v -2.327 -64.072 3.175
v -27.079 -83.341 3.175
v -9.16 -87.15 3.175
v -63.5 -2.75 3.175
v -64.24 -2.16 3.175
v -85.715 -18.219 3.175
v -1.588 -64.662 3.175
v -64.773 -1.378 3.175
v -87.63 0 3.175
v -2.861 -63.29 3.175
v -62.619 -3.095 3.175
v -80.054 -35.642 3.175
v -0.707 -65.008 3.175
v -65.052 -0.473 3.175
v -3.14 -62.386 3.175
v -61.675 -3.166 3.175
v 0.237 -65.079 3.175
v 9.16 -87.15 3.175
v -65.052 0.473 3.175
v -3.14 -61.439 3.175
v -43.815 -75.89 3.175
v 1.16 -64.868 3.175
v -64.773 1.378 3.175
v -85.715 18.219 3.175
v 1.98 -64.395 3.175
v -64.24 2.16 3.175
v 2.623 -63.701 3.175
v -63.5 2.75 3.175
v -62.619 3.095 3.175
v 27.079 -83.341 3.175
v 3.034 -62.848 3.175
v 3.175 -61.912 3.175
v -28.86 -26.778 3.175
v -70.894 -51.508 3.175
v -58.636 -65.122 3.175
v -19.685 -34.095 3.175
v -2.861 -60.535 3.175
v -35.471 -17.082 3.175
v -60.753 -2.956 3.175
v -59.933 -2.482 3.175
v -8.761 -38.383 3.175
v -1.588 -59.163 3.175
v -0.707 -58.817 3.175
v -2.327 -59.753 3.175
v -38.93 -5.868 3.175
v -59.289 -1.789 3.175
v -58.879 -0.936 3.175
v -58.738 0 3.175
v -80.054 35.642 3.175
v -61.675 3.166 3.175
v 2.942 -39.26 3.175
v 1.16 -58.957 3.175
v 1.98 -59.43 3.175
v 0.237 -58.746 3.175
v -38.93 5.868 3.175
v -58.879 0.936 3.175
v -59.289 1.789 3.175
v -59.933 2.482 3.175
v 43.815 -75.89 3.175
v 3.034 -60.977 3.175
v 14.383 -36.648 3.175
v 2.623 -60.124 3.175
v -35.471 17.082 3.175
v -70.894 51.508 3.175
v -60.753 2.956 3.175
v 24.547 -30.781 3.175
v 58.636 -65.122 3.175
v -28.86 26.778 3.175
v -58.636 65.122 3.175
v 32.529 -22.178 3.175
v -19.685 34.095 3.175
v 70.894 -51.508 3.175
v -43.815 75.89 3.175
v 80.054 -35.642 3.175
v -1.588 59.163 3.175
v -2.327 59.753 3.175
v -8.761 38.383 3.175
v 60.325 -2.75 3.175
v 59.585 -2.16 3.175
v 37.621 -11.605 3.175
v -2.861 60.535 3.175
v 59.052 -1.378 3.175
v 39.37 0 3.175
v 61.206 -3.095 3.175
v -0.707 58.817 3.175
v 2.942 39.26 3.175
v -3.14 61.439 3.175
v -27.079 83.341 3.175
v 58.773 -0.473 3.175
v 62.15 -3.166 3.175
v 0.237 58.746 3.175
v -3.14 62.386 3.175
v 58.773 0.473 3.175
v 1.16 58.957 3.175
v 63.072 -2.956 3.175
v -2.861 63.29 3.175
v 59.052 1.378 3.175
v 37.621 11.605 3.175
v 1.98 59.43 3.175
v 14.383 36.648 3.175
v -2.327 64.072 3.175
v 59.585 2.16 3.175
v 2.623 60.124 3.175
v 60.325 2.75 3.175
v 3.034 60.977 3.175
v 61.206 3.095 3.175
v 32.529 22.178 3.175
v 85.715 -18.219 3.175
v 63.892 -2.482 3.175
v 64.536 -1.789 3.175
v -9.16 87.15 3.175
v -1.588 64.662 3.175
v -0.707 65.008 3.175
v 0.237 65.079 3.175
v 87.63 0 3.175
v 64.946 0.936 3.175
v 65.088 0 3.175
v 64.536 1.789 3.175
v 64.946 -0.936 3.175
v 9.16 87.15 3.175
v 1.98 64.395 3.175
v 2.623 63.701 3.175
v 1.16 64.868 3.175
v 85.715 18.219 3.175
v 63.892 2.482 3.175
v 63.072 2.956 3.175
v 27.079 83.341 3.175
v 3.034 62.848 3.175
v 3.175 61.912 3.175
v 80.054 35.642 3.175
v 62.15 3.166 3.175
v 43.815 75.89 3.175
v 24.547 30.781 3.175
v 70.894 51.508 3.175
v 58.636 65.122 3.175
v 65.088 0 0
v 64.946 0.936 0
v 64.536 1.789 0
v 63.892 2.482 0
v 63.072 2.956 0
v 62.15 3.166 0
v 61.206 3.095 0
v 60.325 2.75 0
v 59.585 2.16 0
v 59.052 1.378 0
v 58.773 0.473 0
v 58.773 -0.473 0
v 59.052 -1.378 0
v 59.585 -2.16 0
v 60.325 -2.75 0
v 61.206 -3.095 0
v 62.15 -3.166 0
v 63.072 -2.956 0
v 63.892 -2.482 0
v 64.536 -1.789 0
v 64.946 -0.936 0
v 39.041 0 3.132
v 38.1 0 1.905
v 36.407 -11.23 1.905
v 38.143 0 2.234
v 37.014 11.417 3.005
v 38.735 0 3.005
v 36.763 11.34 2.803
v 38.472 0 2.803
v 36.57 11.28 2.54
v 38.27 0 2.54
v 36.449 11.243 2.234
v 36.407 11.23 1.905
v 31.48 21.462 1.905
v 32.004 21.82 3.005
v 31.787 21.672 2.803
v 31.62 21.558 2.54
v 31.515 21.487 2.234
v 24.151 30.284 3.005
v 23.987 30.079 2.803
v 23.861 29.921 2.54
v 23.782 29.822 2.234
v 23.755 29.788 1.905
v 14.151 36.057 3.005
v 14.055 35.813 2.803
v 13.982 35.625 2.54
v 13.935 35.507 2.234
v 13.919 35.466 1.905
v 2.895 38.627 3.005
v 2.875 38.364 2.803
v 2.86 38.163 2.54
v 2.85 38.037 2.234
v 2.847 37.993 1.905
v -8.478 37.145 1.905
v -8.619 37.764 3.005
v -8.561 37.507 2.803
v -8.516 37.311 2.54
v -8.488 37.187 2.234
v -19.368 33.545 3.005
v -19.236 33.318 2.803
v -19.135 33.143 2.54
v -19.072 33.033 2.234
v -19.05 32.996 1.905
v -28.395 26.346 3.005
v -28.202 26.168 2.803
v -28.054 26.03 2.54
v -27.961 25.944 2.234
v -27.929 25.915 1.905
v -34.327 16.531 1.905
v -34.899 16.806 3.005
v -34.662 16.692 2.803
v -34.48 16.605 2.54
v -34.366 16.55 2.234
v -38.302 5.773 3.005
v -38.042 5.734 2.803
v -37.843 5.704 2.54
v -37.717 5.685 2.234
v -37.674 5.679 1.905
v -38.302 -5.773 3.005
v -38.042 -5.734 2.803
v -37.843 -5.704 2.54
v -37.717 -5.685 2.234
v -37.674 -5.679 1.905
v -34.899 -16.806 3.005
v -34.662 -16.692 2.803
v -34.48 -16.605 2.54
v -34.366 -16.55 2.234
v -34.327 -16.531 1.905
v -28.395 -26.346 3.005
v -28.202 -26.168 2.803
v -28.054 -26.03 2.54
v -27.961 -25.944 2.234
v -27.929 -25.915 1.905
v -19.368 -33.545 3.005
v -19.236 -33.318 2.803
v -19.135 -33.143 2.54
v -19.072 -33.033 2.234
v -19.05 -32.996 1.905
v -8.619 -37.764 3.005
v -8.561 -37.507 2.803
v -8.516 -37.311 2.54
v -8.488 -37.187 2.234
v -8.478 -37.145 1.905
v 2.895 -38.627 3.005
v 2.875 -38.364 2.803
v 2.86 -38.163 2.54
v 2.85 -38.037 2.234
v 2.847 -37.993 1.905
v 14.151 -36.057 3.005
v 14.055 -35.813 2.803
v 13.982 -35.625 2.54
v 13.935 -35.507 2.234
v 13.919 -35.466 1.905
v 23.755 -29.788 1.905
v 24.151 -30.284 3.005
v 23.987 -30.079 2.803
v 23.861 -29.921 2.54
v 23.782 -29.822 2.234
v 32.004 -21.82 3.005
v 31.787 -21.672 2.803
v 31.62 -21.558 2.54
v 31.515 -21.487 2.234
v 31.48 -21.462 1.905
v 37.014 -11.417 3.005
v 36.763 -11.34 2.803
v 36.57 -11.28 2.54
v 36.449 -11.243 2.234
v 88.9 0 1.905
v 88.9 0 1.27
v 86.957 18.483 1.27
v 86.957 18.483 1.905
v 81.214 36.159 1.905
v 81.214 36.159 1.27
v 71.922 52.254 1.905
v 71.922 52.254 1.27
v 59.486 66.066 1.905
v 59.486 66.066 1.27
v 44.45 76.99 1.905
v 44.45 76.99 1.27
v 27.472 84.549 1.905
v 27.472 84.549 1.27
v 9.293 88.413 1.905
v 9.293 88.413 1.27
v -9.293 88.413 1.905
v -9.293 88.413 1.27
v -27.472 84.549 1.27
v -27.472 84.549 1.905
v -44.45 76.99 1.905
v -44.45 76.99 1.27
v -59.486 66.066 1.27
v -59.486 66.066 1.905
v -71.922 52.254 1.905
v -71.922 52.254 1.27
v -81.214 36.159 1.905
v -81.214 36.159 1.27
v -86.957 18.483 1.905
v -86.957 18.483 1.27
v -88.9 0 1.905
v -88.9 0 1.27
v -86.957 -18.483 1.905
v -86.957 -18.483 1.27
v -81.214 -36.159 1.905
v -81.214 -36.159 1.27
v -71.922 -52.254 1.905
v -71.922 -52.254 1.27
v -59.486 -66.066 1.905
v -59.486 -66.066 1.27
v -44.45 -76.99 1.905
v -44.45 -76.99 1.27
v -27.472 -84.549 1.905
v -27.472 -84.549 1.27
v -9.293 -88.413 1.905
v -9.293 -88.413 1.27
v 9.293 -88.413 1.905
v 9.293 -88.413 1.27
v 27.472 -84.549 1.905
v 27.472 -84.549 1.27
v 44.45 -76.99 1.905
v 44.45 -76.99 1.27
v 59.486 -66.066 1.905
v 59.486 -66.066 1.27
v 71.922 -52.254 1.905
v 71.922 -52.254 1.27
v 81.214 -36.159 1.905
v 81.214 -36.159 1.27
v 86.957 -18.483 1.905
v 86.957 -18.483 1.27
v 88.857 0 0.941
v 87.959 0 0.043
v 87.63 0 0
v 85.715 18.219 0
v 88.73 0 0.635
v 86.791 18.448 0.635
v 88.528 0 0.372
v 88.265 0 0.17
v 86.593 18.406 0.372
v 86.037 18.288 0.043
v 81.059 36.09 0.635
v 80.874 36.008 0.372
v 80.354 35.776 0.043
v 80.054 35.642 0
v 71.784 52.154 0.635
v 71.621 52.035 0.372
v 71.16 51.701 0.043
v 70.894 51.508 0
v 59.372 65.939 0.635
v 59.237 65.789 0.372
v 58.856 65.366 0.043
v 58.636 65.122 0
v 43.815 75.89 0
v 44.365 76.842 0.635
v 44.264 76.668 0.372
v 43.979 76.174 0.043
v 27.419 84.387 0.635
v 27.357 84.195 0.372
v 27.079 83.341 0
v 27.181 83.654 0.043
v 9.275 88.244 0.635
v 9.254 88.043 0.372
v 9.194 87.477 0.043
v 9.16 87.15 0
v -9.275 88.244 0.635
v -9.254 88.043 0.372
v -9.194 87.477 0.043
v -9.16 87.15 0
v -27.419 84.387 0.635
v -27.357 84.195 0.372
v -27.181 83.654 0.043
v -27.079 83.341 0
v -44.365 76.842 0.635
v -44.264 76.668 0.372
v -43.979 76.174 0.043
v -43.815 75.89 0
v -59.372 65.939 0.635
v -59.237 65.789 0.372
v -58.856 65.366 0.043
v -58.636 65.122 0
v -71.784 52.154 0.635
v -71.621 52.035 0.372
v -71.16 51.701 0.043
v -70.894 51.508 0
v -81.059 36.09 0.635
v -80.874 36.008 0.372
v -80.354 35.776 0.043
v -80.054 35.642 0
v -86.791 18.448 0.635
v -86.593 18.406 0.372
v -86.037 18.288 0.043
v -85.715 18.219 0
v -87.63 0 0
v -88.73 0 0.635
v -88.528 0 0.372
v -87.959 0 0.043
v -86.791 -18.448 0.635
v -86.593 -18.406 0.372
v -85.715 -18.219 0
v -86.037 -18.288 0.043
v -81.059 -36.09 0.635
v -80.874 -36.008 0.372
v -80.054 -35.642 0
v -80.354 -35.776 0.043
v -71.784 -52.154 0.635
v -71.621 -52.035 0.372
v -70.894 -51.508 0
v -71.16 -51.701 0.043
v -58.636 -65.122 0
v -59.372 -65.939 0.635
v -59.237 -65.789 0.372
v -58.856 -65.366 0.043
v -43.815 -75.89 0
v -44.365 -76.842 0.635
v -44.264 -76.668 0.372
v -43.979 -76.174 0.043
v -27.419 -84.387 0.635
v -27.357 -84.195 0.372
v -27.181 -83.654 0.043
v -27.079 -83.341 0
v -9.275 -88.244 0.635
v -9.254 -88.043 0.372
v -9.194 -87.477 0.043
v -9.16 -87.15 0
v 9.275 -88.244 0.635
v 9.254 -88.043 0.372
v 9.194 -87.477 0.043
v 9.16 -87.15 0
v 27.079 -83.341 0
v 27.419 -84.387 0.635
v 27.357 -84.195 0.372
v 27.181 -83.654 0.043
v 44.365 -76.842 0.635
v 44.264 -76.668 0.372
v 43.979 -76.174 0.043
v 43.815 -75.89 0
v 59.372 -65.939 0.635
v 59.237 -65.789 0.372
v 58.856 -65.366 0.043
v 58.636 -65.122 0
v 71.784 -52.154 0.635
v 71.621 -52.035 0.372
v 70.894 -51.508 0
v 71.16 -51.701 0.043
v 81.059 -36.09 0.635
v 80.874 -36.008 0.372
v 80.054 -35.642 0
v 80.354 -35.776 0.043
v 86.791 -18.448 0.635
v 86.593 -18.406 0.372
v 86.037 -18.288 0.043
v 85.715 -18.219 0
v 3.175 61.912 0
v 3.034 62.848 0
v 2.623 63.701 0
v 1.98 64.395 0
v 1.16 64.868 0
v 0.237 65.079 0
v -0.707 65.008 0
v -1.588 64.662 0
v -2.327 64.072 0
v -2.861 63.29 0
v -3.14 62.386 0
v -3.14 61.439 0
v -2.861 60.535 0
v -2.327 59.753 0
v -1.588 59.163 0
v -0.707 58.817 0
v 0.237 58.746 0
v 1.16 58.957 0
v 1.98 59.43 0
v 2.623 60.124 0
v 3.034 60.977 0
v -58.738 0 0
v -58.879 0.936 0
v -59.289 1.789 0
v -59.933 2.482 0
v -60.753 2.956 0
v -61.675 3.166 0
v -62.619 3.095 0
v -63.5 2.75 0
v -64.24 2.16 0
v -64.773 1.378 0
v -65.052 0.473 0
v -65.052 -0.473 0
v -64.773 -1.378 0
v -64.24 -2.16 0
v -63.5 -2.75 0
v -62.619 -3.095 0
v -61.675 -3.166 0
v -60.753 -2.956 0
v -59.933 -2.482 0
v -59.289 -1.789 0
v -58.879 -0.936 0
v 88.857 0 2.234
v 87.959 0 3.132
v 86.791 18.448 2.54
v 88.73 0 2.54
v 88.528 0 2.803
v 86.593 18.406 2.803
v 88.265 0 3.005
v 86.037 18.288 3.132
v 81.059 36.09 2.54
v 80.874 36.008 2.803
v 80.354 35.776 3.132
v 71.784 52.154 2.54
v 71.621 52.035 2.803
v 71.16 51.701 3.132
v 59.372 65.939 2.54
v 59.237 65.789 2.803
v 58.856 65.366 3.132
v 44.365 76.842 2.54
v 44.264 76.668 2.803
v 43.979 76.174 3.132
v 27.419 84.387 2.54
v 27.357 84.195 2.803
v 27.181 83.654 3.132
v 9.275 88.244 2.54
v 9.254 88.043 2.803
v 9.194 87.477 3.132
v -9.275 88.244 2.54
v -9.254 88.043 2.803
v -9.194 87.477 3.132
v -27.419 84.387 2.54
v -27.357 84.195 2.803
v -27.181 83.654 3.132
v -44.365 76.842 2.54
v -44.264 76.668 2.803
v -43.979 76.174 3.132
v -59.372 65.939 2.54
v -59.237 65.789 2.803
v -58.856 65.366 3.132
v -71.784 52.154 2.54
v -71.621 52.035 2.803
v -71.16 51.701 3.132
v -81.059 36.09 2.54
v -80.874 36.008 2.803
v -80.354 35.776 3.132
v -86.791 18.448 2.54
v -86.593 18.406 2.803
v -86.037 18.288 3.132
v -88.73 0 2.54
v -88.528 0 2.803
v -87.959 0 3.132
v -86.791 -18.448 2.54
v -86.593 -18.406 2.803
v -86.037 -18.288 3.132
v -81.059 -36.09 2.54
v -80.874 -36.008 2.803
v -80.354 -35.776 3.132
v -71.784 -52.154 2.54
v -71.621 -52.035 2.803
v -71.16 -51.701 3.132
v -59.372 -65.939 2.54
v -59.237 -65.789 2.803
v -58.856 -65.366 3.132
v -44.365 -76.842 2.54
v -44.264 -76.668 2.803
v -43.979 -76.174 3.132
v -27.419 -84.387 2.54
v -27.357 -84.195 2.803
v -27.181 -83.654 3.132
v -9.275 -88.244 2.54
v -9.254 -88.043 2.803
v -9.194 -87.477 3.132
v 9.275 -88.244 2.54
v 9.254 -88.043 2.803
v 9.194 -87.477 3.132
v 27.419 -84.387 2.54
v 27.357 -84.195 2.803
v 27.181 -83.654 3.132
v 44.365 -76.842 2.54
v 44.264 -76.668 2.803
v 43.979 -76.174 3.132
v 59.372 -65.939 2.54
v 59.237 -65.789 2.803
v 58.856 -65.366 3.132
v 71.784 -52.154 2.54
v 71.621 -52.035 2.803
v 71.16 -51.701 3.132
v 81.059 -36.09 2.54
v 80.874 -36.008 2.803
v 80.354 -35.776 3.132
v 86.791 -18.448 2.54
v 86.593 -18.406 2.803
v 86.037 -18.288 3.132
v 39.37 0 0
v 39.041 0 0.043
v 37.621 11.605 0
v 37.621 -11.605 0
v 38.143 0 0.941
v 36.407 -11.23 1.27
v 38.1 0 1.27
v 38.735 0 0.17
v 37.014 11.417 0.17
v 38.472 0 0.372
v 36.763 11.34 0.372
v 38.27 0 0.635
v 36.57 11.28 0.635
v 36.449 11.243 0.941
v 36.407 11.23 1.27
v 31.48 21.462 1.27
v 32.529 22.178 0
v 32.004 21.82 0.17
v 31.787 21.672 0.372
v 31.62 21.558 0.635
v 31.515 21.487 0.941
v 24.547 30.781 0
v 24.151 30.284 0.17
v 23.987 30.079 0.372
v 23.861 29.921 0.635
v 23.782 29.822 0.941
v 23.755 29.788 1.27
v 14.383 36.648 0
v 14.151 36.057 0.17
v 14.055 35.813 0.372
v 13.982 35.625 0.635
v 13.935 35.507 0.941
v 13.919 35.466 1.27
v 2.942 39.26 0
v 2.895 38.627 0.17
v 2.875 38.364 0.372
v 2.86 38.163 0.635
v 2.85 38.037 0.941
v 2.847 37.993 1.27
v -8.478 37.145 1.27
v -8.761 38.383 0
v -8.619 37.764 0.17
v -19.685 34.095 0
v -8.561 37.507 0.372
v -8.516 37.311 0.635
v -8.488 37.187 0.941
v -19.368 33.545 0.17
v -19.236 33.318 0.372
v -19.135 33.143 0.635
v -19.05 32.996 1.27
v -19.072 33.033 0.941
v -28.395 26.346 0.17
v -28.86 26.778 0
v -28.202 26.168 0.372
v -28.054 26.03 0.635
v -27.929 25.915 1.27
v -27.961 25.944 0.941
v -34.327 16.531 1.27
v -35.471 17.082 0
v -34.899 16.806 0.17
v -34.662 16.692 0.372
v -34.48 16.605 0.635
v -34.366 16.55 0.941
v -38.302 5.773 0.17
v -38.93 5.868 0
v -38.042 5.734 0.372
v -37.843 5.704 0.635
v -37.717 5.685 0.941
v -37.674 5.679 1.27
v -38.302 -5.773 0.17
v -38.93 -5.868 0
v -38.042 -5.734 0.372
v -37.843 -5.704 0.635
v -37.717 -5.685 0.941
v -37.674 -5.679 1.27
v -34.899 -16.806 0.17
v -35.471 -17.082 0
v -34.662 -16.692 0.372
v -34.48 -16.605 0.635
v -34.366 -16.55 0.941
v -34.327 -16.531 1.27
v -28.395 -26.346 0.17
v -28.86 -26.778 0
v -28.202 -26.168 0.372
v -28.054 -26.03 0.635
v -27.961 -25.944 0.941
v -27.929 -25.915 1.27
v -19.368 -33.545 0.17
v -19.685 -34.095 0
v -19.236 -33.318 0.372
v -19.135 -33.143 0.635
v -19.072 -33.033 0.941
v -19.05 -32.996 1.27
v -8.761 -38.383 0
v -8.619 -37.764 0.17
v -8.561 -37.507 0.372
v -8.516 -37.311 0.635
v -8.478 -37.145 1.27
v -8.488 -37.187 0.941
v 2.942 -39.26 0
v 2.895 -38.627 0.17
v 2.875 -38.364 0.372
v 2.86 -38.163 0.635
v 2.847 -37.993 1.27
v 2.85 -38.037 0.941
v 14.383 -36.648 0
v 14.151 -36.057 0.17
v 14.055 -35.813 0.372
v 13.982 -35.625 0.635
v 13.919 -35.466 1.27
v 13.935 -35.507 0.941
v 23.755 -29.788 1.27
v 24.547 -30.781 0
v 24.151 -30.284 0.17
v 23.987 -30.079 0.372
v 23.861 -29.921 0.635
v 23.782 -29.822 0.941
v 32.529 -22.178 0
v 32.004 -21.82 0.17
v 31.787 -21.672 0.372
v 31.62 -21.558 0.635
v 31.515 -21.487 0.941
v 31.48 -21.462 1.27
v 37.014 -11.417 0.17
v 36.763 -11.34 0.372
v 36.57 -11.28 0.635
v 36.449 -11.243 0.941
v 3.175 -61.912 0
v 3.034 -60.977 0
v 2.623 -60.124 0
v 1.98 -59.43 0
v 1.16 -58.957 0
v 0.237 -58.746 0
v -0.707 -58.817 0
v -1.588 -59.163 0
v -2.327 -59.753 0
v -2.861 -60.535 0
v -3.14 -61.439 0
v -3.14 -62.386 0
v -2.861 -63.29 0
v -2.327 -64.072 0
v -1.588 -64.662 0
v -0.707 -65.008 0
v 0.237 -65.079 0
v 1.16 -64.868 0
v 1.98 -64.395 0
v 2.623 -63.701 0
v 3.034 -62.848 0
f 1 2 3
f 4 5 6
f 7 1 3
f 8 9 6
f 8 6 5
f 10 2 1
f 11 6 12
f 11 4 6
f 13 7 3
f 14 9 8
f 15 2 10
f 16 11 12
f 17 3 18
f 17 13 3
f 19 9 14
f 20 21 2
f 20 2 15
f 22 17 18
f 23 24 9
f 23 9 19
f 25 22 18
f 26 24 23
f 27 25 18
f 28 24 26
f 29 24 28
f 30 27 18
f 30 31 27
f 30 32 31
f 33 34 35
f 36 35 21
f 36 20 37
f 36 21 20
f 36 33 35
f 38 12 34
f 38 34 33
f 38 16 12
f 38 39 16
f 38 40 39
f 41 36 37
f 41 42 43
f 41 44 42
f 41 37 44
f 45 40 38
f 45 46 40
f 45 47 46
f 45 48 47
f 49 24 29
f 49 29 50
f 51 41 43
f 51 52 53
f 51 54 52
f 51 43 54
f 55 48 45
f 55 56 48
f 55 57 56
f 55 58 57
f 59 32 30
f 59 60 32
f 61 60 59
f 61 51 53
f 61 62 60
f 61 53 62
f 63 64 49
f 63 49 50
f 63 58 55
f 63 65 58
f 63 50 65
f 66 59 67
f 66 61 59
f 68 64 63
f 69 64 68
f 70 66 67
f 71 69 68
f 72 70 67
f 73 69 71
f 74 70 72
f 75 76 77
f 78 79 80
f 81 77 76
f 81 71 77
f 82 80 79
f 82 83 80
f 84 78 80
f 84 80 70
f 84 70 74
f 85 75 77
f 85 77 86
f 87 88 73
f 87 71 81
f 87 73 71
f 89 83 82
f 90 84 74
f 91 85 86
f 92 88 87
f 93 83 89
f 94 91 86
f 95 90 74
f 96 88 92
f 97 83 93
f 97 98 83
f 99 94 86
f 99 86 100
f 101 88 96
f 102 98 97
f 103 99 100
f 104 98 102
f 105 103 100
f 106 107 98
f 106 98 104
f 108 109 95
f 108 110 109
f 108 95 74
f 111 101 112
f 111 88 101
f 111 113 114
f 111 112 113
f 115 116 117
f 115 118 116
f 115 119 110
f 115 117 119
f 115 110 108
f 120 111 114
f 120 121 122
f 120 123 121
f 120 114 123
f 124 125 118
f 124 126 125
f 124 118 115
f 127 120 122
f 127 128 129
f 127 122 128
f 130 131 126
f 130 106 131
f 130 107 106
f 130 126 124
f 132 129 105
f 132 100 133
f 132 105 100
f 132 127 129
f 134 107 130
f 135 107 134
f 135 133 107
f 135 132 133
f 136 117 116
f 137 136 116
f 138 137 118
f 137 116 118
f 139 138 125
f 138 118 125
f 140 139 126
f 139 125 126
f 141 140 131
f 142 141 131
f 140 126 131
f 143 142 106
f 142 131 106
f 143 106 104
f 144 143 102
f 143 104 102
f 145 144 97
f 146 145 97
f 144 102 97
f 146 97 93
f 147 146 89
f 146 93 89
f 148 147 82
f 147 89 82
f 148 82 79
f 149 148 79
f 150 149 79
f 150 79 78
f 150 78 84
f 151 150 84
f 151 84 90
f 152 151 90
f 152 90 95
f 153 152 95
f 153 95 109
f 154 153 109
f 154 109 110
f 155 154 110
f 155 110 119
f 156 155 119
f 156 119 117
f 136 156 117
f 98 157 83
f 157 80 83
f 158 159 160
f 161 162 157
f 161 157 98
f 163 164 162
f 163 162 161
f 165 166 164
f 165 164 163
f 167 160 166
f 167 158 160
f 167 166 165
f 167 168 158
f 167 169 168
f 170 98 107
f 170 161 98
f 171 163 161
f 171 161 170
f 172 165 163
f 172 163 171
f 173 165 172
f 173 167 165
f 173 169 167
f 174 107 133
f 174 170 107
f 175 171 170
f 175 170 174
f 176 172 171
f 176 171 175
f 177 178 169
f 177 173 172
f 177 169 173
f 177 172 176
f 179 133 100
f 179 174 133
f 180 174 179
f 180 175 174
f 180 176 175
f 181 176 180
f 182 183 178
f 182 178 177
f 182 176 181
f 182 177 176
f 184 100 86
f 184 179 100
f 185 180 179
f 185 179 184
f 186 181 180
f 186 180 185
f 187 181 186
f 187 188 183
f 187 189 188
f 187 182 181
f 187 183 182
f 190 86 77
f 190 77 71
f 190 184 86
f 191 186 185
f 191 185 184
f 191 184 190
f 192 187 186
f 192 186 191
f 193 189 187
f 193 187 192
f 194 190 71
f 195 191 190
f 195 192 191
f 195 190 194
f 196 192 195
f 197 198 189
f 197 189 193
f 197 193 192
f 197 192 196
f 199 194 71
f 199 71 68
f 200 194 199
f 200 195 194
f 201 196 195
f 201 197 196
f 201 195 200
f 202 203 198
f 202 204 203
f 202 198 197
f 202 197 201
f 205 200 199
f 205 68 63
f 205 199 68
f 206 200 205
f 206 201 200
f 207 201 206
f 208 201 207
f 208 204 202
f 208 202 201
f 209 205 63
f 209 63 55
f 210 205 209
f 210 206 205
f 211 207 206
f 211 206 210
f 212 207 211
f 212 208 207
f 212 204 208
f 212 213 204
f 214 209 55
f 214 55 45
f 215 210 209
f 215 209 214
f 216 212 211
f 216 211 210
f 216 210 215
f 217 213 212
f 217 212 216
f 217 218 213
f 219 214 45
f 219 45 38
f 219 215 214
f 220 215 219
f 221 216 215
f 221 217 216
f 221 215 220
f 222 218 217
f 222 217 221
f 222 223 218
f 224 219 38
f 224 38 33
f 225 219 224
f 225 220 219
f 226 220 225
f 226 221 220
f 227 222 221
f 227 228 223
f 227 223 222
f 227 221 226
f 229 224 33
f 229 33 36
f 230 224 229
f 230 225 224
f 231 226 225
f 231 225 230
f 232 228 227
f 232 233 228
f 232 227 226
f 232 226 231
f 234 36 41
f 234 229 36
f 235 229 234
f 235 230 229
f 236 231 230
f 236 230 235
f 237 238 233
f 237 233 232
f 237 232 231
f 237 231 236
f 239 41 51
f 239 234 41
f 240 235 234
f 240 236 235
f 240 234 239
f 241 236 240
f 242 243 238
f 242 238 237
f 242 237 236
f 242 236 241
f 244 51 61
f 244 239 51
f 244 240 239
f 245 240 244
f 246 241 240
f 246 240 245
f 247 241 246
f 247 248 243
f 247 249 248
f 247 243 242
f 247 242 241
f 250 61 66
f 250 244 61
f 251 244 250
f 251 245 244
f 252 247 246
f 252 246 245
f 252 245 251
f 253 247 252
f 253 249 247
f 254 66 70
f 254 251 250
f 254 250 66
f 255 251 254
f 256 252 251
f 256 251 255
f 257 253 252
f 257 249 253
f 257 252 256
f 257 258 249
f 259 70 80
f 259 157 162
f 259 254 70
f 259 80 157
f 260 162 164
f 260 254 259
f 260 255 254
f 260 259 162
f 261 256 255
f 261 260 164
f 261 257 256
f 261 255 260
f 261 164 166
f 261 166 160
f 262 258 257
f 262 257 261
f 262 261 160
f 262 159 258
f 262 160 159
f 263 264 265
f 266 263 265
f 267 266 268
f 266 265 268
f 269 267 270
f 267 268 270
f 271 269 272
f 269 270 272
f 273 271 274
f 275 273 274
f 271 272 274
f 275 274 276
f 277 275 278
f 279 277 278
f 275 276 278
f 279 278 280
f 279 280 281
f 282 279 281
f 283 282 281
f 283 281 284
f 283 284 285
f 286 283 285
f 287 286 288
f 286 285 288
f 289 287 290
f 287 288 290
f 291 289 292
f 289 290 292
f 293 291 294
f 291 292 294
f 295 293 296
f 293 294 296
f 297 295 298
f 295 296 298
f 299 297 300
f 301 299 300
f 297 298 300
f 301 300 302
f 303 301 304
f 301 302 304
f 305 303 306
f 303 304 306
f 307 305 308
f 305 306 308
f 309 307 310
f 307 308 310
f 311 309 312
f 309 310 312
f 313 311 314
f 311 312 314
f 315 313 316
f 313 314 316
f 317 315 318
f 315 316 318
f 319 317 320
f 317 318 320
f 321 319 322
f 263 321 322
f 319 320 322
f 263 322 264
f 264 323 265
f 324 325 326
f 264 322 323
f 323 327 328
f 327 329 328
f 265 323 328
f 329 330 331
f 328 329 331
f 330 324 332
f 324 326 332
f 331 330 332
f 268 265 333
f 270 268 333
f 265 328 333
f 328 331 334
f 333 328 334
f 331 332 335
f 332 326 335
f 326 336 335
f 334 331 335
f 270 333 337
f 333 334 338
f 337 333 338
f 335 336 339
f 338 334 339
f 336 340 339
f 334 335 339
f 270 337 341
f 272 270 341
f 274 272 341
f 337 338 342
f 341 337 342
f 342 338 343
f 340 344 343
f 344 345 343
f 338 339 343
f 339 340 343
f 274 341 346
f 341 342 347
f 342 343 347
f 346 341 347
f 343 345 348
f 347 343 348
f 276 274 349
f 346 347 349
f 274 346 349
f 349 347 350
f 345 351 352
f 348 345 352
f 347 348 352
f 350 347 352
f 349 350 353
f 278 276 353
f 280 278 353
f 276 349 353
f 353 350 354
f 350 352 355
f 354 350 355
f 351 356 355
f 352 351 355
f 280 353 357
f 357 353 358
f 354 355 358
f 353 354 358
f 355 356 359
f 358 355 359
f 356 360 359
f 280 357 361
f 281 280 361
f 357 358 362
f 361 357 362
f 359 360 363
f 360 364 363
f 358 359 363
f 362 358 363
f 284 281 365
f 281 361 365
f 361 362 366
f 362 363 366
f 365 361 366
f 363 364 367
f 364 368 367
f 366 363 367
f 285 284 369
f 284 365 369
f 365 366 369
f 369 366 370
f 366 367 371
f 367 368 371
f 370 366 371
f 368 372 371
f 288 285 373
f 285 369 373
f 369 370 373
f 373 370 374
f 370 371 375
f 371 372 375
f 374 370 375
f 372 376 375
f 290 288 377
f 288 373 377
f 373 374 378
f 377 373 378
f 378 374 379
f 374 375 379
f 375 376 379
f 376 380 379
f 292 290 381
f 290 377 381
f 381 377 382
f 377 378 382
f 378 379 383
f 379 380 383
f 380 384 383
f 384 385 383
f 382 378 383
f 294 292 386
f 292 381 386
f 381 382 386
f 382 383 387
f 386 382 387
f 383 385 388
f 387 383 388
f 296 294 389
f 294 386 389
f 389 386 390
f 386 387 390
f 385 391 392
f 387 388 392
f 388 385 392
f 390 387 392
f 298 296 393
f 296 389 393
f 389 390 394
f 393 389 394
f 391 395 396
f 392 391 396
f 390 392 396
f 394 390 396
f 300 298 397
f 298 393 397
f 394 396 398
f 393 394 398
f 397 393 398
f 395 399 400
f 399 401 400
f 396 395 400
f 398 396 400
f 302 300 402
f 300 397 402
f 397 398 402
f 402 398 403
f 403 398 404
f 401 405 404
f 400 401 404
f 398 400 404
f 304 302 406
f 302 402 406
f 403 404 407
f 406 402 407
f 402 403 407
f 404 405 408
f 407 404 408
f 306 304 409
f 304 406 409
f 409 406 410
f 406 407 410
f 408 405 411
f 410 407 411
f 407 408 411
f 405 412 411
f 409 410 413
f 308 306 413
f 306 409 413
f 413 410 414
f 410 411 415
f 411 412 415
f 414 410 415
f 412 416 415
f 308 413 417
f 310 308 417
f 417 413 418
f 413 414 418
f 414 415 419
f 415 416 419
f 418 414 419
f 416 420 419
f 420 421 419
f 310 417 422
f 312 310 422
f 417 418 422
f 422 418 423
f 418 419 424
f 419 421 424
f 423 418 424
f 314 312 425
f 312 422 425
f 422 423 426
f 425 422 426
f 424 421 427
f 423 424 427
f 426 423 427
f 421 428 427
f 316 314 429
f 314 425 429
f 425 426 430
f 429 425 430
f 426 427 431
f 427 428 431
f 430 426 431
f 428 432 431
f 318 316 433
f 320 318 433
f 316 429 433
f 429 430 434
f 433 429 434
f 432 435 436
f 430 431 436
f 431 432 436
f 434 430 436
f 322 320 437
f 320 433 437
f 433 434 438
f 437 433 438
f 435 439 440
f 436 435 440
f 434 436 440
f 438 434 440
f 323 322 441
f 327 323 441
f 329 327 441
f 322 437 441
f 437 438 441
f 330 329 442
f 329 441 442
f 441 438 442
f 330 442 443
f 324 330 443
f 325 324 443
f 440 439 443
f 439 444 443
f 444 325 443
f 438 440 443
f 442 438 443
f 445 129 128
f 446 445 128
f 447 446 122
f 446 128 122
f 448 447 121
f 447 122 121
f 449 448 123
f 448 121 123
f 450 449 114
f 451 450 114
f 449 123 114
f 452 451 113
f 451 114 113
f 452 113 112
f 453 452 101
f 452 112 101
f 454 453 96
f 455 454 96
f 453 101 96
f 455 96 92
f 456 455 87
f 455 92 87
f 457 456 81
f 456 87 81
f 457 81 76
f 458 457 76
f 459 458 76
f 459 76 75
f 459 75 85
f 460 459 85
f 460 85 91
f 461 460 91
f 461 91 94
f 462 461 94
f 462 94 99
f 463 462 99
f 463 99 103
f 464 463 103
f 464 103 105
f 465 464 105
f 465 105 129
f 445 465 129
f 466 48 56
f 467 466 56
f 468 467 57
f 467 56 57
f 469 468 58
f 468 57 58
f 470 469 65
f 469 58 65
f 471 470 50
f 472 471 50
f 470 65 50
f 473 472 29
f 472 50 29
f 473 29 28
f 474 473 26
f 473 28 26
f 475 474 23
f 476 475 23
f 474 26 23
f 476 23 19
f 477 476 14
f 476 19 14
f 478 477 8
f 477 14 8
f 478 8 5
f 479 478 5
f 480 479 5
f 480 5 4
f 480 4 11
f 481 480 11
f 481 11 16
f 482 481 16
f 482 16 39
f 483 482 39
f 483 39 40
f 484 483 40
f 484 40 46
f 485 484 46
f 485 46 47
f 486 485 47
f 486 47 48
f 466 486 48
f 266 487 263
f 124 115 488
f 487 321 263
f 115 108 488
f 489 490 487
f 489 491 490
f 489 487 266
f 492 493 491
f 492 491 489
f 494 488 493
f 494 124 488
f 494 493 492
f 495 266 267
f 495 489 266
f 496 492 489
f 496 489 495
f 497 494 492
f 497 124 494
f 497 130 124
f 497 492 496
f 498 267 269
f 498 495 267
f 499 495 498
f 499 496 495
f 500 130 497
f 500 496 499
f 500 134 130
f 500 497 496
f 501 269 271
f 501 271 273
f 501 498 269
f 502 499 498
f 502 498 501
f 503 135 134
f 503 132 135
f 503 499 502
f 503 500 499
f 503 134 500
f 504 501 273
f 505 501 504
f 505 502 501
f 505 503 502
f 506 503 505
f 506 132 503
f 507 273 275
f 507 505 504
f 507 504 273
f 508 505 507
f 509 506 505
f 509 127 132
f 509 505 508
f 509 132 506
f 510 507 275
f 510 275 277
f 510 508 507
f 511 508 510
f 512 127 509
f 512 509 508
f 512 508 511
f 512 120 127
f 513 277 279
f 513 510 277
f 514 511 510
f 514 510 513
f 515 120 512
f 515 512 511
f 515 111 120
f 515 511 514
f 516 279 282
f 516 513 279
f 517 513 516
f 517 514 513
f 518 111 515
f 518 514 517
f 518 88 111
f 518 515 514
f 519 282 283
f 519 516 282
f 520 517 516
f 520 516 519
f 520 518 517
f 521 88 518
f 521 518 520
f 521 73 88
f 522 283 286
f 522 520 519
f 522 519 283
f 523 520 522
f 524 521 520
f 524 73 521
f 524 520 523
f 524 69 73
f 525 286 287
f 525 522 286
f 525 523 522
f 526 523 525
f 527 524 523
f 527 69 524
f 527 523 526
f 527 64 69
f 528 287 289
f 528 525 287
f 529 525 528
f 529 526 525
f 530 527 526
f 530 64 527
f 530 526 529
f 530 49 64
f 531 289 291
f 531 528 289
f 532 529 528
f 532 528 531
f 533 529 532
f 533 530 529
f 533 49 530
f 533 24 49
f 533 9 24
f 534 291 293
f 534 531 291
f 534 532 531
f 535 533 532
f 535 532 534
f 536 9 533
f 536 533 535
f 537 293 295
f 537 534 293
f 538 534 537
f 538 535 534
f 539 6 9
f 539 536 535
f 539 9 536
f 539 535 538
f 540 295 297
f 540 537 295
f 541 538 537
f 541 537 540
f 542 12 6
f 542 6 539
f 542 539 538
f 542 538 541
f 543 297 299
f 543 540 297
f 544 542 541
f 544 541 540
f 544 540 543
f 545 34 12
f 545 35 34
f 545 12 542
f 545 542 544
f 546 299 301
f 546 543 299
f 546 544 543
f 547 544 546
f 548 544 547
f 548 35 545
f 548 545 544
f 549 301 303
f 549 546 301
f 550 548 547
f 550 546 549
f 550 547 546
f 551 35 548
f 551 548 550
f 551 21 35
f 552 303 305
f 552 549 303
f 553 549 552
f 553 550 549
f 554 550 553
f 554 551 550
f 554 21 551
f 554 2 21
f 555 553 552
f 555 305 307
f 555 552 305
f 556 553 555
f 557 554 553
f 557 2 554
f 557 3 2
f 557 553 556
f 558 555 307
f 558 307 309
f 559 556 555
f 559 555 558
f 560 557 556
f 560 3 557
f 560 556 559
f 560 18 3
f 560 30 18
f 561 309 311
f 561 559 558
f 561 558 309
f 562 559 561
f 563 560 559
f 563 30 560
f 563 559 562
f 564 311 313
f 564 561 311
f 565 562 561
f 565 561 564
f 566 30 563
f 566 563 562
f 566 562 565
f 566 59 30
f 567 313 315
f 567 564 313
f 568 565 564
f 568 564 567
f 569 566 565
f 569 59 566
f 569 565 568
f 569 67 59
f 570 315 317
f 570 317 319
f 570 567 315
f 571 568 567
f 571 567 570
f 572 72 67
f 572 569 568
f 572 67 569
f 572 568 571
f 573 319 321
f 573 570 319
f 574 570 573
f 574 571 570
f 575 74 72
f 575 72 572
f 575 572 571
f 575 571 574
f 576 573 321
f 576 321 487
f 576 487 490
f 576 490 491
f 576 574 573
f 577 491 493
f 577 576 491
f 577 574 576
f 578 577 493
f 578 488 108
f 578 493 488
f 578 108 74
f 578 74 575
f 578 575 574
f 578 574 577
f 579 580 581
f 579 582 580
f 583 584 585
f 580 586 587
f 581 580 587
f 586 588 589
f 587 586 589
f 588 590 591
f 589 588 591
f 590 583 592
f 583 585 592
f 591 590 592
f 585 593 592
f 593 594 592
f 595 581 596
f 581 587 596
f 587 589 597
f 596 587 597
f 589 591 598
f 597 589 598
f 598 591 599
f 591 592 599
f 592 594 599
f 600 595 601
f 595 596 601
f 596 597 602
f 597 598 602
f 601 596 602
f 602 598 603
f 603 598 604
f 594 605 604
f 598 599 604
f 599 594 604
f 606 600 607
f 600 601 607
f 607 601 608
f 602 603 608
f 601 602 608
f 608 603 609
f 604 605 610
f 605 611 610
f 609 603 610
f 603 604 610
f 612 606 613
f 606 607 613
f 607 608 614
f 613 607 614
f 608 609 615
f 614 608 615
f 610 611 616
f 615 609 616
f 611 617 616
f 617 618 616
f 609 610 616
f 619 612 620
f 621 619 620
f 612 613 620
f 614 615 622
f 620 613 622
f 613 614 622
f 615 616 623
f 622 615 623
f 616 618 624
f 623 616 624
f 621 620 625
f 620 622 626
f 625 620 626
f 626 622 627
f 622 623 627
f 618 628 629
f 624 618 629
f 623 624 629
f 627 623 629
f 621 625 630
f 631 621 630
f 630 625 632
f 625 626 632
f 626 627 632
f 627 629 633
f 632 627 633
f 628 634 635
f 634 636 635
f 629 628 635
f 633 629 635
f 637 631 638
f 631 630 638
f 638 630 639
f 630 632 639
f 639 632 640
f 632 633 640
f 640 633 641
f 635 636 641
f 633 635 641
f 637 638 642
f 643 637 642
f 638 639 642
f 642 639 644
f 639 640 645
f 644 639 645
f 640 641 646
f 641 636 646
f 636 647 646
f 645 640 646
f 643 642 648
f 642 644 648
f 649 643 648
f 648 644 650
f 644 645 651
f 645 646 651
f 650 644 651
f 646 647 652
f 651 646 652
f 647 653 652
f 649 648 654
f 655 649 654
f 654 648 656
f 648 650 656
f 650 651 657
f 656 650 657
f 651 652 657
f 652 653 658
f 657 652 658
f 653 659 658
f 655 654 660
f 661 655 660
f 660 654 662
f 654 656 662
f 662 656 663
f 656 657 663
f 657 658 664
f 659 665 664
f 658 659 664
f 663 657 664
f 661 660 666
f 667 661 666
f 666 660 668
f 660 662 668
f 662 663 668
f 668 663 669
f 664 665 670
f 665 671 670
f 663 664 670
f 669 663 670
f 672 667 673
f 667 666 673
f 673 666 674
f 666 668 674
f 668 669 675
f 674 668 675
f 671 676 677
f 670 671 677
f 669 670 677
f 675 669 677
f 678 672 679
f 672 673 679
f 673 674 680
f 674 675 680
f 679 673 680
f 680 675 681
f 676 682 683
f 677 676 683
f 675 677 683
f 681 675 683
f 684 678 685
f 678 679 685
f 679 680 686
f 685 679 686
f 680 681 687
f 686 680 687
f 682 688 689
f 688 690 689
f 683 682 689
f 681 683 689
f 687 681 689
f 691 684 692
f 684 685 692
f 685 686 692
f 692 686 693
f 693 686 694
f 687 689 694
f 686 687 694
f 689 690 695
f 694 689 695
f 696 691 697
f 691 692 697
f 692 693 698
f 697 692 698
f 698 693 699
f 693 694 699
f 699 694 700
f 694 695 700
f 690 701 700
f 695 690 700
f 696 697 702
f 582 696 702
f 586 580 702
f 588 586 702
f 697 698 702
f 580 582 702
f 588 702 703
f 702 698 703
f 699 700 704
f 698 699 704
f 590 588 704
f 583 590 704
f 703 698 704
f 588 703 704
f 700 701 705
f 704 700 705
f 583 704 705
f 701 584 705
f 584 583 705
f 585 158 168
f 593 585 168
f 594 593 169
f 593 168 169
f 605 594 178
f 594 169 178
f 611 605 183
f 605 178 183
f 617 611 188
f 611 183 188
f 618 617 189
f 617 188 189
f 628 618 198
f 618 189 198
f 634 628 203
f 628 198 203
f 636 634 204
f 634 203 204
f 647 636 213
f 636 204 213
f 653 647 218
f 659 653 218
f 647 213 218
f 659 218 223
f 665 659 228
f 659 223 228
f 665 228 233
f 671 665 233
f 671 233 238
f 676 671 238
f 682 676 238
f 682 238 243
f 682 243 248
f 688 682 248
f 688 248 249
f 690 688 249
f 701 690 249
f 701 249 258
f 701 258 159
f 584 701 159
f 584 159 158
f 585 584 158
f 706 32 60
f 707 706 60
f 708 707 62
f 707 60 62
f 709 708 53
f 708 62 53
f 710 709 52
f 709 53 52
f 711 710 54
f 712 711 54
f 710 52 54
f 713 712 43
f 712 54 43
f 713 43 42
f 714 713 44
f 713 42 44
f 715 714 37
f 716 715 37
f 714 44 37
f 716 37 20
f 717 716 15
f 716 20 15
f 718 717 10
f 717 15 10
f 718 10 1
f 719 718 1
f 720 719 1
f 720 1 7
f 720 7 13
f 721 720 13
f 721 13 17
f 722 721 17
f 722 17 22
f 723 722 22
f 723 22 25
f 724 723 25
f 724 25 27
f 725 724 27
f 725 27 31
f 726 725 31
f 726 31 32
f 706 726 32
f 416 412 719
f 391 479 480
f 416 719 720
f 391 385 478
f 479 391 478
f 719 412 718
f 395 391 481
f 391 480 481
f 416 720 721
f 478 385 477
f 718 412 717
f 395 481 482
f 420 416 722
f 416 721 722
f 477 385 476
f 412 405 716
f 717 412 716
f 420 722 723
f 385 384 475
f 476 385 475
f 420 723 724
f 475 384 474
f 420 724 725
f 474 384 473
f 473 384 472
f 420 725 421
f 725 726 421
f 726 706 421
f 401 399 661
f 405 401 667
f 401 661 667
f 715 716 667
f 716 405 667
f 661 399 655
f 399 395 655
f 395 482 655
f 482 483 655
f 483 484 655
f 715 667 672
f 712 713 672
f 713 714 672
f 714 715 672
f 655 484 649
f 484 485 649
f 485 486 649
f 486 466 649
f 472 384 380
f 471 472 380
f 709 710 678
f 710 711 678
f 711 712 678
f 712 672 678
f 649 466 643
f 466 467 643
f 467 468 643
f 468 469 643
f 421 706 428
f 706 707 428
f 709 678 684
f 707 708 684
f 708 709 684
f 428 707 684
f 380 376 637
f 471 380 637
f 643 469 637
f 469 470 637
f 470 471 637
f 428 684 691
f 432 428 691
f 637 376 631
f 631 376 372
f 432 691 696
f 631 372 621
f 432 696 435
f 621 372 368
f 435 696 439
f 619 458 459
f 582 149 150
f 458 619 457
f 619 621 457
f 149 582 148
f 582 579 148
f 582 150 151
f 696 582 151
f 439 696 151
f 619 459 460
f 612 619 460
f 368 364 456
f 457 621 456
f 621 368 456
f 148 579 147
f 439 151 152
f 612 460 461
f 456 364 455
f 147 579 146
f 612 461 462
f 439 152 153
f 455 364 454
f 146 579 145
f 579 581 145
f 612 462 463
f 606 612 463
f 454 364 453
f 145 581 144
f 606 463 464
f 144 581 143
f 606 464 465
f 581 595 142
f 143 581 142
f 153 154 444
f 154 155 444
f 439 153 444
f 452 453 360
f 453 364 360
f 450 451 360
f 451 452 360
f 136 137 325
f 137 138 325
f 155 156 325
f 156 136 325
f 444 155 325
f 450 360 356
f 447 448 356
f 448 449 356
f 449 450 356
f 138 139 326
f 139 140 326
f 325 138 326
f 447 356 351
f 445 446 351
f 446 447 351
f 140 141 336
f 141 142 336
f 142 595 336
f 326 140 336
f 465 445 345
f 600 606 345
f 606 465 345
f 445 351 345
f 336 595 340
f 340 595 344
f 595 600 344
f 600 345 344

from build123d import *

# Parameters (mm, degrees)
SKETCH1_R           = 88.9
BOSS_EXTRUDE1_DEPTH = 3.175
FILLET1_R           = 1.27
SKETCH2_R           = 38.1
SKETCH2_R_2         = 3.175
CUT_EXTRUDE1_DEPTH  = 12.7
FILLET2_R           = 1.27


with BuildPart() as part:
    # Sketch1 → Boss-Extrude1 (new body)
    with BuildSketch(Plane.XY):
        Circle(SKETCH1_R)
    extrude(amount=BOSS_EXTRUDE1_DEPTH)

    # Fillet1
    fillet1_edges = [part.edges().sort_by_distance(p)[0] for p in [
        (-88.9, 0, 0),
        (-88.9, 0, 3.175),
    ]]
    fillet(fillet1_edges, radius=FILLET1_R)

    # Sketch2 → Cut-Extrude1 (cut)
    with BuildSketch(Plane.XY.offset(3.175)):
        Circle(SKETCH2_R)
        with Locations((0, 61.9125)):
            Circle(SKETCH2_R_2)
        with Locations((61.9125, 0)):
            Circle(SKETCH2_R_2)
        with Locations((0, -61.9125)):
            Circle(SKETCH2_R_2)
        with Locations((-61.9125, 0)):
            Circle(SKETCH2_R_2)
    extrude(amount=-CUT_EXTRUDE1_DEPTH, mode=Mode.SUBTRACT)

    # Fillet2
    fillet2_edges = [part.edges().sort_by_distance(p)[0] for p in [
        (-38.1, 0, 0),
        (-38.1, 0, 3.175),
    ]]
    fillet(fillet2_edges, radius=FILLET2_R)


solid = part.part
